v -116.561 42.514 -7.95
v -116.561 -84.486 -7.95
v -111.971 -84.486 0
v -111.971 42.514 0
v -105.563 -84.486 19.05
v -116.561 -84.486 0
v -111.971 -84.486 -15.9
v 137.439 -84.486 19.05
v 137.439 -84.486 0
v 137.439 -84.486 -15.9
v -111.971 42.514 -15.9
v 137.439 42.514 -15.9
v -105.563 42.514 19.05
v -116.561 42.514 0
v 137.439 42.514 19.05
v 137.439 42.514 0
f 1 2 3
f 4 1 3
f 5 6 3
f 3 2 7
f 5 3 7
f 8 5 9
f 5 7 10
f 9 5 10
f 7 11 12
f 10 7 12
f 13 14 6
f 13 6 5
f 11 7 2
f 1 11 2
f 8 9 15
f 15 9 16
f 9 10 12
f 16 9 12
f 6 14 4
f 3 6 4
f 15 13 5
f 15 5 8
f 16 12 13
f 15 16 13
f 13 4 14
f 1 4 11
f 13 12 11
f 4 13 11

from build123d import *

# Parameters (mm, degrees)
F0_W     = 254
F0_H     = 127
F1_DEPTH = 15.9
F3_DEPTH = 127
F4_W     = 4.5899346401
F4_H     = 127
F4_W_2   = 249.4100653599
F5_DEPTH = 19.05
F7_DEPTH = 127


# Not quite as in the source:
# - the program builds the solid bodies; features that only make, move or delete a surface that nothing else refers to are left out


with BuildPart() as f1:
    # F0 (on Top) → F1 (new body)
    with BuildSketch(Plane.XY):
        with Locations((10.4389302433, -20.9855538282)):
            Rectangle(F0_W, F0_H)
    extrude(amount=-F1_DEPTH)

    # F2 (on face) → F3 (cut)
    with BuildSketch(Plane.XZ.offset(84.4855538282)):
        Polygon((-116.5610697567, 0), (-116.5610697567, -7.95), (-111.9711351167, 0), align=None)
        Polygon((-111.9711351167, -15.9), (-116.5610697567, -7.95), (-116.5610697567, -15.9), align=None)
    extrude(amount=-F3_DEPTH, mode=Mode.SUBTRACT)

    # F4 (on face) → F5 (join)
    with BuildSketch(Plane.XY):
        with Locations((-114.2661024367, -20.9855538282)):
            Rectangle(F4_W, F4_H)
        with Locations((12.7338975633, -20.9855538282)):
            Rectangle(F4_W_2, F4_H)
    extrude(amount=F5_DEPTH)

    # F6 (on face) → F7 (cut)
    with BuildSketch(Plane.XZ.offset(84.4855538282)):
        Polygon((-116.5610697567, 19.05), (-116.5610697567, 0), (-105.5625471287, 19.05), align=None)
    extrude(amount=-F7_DEPTH, mode=Mode.SUBTRACT)


solid = f1.part
